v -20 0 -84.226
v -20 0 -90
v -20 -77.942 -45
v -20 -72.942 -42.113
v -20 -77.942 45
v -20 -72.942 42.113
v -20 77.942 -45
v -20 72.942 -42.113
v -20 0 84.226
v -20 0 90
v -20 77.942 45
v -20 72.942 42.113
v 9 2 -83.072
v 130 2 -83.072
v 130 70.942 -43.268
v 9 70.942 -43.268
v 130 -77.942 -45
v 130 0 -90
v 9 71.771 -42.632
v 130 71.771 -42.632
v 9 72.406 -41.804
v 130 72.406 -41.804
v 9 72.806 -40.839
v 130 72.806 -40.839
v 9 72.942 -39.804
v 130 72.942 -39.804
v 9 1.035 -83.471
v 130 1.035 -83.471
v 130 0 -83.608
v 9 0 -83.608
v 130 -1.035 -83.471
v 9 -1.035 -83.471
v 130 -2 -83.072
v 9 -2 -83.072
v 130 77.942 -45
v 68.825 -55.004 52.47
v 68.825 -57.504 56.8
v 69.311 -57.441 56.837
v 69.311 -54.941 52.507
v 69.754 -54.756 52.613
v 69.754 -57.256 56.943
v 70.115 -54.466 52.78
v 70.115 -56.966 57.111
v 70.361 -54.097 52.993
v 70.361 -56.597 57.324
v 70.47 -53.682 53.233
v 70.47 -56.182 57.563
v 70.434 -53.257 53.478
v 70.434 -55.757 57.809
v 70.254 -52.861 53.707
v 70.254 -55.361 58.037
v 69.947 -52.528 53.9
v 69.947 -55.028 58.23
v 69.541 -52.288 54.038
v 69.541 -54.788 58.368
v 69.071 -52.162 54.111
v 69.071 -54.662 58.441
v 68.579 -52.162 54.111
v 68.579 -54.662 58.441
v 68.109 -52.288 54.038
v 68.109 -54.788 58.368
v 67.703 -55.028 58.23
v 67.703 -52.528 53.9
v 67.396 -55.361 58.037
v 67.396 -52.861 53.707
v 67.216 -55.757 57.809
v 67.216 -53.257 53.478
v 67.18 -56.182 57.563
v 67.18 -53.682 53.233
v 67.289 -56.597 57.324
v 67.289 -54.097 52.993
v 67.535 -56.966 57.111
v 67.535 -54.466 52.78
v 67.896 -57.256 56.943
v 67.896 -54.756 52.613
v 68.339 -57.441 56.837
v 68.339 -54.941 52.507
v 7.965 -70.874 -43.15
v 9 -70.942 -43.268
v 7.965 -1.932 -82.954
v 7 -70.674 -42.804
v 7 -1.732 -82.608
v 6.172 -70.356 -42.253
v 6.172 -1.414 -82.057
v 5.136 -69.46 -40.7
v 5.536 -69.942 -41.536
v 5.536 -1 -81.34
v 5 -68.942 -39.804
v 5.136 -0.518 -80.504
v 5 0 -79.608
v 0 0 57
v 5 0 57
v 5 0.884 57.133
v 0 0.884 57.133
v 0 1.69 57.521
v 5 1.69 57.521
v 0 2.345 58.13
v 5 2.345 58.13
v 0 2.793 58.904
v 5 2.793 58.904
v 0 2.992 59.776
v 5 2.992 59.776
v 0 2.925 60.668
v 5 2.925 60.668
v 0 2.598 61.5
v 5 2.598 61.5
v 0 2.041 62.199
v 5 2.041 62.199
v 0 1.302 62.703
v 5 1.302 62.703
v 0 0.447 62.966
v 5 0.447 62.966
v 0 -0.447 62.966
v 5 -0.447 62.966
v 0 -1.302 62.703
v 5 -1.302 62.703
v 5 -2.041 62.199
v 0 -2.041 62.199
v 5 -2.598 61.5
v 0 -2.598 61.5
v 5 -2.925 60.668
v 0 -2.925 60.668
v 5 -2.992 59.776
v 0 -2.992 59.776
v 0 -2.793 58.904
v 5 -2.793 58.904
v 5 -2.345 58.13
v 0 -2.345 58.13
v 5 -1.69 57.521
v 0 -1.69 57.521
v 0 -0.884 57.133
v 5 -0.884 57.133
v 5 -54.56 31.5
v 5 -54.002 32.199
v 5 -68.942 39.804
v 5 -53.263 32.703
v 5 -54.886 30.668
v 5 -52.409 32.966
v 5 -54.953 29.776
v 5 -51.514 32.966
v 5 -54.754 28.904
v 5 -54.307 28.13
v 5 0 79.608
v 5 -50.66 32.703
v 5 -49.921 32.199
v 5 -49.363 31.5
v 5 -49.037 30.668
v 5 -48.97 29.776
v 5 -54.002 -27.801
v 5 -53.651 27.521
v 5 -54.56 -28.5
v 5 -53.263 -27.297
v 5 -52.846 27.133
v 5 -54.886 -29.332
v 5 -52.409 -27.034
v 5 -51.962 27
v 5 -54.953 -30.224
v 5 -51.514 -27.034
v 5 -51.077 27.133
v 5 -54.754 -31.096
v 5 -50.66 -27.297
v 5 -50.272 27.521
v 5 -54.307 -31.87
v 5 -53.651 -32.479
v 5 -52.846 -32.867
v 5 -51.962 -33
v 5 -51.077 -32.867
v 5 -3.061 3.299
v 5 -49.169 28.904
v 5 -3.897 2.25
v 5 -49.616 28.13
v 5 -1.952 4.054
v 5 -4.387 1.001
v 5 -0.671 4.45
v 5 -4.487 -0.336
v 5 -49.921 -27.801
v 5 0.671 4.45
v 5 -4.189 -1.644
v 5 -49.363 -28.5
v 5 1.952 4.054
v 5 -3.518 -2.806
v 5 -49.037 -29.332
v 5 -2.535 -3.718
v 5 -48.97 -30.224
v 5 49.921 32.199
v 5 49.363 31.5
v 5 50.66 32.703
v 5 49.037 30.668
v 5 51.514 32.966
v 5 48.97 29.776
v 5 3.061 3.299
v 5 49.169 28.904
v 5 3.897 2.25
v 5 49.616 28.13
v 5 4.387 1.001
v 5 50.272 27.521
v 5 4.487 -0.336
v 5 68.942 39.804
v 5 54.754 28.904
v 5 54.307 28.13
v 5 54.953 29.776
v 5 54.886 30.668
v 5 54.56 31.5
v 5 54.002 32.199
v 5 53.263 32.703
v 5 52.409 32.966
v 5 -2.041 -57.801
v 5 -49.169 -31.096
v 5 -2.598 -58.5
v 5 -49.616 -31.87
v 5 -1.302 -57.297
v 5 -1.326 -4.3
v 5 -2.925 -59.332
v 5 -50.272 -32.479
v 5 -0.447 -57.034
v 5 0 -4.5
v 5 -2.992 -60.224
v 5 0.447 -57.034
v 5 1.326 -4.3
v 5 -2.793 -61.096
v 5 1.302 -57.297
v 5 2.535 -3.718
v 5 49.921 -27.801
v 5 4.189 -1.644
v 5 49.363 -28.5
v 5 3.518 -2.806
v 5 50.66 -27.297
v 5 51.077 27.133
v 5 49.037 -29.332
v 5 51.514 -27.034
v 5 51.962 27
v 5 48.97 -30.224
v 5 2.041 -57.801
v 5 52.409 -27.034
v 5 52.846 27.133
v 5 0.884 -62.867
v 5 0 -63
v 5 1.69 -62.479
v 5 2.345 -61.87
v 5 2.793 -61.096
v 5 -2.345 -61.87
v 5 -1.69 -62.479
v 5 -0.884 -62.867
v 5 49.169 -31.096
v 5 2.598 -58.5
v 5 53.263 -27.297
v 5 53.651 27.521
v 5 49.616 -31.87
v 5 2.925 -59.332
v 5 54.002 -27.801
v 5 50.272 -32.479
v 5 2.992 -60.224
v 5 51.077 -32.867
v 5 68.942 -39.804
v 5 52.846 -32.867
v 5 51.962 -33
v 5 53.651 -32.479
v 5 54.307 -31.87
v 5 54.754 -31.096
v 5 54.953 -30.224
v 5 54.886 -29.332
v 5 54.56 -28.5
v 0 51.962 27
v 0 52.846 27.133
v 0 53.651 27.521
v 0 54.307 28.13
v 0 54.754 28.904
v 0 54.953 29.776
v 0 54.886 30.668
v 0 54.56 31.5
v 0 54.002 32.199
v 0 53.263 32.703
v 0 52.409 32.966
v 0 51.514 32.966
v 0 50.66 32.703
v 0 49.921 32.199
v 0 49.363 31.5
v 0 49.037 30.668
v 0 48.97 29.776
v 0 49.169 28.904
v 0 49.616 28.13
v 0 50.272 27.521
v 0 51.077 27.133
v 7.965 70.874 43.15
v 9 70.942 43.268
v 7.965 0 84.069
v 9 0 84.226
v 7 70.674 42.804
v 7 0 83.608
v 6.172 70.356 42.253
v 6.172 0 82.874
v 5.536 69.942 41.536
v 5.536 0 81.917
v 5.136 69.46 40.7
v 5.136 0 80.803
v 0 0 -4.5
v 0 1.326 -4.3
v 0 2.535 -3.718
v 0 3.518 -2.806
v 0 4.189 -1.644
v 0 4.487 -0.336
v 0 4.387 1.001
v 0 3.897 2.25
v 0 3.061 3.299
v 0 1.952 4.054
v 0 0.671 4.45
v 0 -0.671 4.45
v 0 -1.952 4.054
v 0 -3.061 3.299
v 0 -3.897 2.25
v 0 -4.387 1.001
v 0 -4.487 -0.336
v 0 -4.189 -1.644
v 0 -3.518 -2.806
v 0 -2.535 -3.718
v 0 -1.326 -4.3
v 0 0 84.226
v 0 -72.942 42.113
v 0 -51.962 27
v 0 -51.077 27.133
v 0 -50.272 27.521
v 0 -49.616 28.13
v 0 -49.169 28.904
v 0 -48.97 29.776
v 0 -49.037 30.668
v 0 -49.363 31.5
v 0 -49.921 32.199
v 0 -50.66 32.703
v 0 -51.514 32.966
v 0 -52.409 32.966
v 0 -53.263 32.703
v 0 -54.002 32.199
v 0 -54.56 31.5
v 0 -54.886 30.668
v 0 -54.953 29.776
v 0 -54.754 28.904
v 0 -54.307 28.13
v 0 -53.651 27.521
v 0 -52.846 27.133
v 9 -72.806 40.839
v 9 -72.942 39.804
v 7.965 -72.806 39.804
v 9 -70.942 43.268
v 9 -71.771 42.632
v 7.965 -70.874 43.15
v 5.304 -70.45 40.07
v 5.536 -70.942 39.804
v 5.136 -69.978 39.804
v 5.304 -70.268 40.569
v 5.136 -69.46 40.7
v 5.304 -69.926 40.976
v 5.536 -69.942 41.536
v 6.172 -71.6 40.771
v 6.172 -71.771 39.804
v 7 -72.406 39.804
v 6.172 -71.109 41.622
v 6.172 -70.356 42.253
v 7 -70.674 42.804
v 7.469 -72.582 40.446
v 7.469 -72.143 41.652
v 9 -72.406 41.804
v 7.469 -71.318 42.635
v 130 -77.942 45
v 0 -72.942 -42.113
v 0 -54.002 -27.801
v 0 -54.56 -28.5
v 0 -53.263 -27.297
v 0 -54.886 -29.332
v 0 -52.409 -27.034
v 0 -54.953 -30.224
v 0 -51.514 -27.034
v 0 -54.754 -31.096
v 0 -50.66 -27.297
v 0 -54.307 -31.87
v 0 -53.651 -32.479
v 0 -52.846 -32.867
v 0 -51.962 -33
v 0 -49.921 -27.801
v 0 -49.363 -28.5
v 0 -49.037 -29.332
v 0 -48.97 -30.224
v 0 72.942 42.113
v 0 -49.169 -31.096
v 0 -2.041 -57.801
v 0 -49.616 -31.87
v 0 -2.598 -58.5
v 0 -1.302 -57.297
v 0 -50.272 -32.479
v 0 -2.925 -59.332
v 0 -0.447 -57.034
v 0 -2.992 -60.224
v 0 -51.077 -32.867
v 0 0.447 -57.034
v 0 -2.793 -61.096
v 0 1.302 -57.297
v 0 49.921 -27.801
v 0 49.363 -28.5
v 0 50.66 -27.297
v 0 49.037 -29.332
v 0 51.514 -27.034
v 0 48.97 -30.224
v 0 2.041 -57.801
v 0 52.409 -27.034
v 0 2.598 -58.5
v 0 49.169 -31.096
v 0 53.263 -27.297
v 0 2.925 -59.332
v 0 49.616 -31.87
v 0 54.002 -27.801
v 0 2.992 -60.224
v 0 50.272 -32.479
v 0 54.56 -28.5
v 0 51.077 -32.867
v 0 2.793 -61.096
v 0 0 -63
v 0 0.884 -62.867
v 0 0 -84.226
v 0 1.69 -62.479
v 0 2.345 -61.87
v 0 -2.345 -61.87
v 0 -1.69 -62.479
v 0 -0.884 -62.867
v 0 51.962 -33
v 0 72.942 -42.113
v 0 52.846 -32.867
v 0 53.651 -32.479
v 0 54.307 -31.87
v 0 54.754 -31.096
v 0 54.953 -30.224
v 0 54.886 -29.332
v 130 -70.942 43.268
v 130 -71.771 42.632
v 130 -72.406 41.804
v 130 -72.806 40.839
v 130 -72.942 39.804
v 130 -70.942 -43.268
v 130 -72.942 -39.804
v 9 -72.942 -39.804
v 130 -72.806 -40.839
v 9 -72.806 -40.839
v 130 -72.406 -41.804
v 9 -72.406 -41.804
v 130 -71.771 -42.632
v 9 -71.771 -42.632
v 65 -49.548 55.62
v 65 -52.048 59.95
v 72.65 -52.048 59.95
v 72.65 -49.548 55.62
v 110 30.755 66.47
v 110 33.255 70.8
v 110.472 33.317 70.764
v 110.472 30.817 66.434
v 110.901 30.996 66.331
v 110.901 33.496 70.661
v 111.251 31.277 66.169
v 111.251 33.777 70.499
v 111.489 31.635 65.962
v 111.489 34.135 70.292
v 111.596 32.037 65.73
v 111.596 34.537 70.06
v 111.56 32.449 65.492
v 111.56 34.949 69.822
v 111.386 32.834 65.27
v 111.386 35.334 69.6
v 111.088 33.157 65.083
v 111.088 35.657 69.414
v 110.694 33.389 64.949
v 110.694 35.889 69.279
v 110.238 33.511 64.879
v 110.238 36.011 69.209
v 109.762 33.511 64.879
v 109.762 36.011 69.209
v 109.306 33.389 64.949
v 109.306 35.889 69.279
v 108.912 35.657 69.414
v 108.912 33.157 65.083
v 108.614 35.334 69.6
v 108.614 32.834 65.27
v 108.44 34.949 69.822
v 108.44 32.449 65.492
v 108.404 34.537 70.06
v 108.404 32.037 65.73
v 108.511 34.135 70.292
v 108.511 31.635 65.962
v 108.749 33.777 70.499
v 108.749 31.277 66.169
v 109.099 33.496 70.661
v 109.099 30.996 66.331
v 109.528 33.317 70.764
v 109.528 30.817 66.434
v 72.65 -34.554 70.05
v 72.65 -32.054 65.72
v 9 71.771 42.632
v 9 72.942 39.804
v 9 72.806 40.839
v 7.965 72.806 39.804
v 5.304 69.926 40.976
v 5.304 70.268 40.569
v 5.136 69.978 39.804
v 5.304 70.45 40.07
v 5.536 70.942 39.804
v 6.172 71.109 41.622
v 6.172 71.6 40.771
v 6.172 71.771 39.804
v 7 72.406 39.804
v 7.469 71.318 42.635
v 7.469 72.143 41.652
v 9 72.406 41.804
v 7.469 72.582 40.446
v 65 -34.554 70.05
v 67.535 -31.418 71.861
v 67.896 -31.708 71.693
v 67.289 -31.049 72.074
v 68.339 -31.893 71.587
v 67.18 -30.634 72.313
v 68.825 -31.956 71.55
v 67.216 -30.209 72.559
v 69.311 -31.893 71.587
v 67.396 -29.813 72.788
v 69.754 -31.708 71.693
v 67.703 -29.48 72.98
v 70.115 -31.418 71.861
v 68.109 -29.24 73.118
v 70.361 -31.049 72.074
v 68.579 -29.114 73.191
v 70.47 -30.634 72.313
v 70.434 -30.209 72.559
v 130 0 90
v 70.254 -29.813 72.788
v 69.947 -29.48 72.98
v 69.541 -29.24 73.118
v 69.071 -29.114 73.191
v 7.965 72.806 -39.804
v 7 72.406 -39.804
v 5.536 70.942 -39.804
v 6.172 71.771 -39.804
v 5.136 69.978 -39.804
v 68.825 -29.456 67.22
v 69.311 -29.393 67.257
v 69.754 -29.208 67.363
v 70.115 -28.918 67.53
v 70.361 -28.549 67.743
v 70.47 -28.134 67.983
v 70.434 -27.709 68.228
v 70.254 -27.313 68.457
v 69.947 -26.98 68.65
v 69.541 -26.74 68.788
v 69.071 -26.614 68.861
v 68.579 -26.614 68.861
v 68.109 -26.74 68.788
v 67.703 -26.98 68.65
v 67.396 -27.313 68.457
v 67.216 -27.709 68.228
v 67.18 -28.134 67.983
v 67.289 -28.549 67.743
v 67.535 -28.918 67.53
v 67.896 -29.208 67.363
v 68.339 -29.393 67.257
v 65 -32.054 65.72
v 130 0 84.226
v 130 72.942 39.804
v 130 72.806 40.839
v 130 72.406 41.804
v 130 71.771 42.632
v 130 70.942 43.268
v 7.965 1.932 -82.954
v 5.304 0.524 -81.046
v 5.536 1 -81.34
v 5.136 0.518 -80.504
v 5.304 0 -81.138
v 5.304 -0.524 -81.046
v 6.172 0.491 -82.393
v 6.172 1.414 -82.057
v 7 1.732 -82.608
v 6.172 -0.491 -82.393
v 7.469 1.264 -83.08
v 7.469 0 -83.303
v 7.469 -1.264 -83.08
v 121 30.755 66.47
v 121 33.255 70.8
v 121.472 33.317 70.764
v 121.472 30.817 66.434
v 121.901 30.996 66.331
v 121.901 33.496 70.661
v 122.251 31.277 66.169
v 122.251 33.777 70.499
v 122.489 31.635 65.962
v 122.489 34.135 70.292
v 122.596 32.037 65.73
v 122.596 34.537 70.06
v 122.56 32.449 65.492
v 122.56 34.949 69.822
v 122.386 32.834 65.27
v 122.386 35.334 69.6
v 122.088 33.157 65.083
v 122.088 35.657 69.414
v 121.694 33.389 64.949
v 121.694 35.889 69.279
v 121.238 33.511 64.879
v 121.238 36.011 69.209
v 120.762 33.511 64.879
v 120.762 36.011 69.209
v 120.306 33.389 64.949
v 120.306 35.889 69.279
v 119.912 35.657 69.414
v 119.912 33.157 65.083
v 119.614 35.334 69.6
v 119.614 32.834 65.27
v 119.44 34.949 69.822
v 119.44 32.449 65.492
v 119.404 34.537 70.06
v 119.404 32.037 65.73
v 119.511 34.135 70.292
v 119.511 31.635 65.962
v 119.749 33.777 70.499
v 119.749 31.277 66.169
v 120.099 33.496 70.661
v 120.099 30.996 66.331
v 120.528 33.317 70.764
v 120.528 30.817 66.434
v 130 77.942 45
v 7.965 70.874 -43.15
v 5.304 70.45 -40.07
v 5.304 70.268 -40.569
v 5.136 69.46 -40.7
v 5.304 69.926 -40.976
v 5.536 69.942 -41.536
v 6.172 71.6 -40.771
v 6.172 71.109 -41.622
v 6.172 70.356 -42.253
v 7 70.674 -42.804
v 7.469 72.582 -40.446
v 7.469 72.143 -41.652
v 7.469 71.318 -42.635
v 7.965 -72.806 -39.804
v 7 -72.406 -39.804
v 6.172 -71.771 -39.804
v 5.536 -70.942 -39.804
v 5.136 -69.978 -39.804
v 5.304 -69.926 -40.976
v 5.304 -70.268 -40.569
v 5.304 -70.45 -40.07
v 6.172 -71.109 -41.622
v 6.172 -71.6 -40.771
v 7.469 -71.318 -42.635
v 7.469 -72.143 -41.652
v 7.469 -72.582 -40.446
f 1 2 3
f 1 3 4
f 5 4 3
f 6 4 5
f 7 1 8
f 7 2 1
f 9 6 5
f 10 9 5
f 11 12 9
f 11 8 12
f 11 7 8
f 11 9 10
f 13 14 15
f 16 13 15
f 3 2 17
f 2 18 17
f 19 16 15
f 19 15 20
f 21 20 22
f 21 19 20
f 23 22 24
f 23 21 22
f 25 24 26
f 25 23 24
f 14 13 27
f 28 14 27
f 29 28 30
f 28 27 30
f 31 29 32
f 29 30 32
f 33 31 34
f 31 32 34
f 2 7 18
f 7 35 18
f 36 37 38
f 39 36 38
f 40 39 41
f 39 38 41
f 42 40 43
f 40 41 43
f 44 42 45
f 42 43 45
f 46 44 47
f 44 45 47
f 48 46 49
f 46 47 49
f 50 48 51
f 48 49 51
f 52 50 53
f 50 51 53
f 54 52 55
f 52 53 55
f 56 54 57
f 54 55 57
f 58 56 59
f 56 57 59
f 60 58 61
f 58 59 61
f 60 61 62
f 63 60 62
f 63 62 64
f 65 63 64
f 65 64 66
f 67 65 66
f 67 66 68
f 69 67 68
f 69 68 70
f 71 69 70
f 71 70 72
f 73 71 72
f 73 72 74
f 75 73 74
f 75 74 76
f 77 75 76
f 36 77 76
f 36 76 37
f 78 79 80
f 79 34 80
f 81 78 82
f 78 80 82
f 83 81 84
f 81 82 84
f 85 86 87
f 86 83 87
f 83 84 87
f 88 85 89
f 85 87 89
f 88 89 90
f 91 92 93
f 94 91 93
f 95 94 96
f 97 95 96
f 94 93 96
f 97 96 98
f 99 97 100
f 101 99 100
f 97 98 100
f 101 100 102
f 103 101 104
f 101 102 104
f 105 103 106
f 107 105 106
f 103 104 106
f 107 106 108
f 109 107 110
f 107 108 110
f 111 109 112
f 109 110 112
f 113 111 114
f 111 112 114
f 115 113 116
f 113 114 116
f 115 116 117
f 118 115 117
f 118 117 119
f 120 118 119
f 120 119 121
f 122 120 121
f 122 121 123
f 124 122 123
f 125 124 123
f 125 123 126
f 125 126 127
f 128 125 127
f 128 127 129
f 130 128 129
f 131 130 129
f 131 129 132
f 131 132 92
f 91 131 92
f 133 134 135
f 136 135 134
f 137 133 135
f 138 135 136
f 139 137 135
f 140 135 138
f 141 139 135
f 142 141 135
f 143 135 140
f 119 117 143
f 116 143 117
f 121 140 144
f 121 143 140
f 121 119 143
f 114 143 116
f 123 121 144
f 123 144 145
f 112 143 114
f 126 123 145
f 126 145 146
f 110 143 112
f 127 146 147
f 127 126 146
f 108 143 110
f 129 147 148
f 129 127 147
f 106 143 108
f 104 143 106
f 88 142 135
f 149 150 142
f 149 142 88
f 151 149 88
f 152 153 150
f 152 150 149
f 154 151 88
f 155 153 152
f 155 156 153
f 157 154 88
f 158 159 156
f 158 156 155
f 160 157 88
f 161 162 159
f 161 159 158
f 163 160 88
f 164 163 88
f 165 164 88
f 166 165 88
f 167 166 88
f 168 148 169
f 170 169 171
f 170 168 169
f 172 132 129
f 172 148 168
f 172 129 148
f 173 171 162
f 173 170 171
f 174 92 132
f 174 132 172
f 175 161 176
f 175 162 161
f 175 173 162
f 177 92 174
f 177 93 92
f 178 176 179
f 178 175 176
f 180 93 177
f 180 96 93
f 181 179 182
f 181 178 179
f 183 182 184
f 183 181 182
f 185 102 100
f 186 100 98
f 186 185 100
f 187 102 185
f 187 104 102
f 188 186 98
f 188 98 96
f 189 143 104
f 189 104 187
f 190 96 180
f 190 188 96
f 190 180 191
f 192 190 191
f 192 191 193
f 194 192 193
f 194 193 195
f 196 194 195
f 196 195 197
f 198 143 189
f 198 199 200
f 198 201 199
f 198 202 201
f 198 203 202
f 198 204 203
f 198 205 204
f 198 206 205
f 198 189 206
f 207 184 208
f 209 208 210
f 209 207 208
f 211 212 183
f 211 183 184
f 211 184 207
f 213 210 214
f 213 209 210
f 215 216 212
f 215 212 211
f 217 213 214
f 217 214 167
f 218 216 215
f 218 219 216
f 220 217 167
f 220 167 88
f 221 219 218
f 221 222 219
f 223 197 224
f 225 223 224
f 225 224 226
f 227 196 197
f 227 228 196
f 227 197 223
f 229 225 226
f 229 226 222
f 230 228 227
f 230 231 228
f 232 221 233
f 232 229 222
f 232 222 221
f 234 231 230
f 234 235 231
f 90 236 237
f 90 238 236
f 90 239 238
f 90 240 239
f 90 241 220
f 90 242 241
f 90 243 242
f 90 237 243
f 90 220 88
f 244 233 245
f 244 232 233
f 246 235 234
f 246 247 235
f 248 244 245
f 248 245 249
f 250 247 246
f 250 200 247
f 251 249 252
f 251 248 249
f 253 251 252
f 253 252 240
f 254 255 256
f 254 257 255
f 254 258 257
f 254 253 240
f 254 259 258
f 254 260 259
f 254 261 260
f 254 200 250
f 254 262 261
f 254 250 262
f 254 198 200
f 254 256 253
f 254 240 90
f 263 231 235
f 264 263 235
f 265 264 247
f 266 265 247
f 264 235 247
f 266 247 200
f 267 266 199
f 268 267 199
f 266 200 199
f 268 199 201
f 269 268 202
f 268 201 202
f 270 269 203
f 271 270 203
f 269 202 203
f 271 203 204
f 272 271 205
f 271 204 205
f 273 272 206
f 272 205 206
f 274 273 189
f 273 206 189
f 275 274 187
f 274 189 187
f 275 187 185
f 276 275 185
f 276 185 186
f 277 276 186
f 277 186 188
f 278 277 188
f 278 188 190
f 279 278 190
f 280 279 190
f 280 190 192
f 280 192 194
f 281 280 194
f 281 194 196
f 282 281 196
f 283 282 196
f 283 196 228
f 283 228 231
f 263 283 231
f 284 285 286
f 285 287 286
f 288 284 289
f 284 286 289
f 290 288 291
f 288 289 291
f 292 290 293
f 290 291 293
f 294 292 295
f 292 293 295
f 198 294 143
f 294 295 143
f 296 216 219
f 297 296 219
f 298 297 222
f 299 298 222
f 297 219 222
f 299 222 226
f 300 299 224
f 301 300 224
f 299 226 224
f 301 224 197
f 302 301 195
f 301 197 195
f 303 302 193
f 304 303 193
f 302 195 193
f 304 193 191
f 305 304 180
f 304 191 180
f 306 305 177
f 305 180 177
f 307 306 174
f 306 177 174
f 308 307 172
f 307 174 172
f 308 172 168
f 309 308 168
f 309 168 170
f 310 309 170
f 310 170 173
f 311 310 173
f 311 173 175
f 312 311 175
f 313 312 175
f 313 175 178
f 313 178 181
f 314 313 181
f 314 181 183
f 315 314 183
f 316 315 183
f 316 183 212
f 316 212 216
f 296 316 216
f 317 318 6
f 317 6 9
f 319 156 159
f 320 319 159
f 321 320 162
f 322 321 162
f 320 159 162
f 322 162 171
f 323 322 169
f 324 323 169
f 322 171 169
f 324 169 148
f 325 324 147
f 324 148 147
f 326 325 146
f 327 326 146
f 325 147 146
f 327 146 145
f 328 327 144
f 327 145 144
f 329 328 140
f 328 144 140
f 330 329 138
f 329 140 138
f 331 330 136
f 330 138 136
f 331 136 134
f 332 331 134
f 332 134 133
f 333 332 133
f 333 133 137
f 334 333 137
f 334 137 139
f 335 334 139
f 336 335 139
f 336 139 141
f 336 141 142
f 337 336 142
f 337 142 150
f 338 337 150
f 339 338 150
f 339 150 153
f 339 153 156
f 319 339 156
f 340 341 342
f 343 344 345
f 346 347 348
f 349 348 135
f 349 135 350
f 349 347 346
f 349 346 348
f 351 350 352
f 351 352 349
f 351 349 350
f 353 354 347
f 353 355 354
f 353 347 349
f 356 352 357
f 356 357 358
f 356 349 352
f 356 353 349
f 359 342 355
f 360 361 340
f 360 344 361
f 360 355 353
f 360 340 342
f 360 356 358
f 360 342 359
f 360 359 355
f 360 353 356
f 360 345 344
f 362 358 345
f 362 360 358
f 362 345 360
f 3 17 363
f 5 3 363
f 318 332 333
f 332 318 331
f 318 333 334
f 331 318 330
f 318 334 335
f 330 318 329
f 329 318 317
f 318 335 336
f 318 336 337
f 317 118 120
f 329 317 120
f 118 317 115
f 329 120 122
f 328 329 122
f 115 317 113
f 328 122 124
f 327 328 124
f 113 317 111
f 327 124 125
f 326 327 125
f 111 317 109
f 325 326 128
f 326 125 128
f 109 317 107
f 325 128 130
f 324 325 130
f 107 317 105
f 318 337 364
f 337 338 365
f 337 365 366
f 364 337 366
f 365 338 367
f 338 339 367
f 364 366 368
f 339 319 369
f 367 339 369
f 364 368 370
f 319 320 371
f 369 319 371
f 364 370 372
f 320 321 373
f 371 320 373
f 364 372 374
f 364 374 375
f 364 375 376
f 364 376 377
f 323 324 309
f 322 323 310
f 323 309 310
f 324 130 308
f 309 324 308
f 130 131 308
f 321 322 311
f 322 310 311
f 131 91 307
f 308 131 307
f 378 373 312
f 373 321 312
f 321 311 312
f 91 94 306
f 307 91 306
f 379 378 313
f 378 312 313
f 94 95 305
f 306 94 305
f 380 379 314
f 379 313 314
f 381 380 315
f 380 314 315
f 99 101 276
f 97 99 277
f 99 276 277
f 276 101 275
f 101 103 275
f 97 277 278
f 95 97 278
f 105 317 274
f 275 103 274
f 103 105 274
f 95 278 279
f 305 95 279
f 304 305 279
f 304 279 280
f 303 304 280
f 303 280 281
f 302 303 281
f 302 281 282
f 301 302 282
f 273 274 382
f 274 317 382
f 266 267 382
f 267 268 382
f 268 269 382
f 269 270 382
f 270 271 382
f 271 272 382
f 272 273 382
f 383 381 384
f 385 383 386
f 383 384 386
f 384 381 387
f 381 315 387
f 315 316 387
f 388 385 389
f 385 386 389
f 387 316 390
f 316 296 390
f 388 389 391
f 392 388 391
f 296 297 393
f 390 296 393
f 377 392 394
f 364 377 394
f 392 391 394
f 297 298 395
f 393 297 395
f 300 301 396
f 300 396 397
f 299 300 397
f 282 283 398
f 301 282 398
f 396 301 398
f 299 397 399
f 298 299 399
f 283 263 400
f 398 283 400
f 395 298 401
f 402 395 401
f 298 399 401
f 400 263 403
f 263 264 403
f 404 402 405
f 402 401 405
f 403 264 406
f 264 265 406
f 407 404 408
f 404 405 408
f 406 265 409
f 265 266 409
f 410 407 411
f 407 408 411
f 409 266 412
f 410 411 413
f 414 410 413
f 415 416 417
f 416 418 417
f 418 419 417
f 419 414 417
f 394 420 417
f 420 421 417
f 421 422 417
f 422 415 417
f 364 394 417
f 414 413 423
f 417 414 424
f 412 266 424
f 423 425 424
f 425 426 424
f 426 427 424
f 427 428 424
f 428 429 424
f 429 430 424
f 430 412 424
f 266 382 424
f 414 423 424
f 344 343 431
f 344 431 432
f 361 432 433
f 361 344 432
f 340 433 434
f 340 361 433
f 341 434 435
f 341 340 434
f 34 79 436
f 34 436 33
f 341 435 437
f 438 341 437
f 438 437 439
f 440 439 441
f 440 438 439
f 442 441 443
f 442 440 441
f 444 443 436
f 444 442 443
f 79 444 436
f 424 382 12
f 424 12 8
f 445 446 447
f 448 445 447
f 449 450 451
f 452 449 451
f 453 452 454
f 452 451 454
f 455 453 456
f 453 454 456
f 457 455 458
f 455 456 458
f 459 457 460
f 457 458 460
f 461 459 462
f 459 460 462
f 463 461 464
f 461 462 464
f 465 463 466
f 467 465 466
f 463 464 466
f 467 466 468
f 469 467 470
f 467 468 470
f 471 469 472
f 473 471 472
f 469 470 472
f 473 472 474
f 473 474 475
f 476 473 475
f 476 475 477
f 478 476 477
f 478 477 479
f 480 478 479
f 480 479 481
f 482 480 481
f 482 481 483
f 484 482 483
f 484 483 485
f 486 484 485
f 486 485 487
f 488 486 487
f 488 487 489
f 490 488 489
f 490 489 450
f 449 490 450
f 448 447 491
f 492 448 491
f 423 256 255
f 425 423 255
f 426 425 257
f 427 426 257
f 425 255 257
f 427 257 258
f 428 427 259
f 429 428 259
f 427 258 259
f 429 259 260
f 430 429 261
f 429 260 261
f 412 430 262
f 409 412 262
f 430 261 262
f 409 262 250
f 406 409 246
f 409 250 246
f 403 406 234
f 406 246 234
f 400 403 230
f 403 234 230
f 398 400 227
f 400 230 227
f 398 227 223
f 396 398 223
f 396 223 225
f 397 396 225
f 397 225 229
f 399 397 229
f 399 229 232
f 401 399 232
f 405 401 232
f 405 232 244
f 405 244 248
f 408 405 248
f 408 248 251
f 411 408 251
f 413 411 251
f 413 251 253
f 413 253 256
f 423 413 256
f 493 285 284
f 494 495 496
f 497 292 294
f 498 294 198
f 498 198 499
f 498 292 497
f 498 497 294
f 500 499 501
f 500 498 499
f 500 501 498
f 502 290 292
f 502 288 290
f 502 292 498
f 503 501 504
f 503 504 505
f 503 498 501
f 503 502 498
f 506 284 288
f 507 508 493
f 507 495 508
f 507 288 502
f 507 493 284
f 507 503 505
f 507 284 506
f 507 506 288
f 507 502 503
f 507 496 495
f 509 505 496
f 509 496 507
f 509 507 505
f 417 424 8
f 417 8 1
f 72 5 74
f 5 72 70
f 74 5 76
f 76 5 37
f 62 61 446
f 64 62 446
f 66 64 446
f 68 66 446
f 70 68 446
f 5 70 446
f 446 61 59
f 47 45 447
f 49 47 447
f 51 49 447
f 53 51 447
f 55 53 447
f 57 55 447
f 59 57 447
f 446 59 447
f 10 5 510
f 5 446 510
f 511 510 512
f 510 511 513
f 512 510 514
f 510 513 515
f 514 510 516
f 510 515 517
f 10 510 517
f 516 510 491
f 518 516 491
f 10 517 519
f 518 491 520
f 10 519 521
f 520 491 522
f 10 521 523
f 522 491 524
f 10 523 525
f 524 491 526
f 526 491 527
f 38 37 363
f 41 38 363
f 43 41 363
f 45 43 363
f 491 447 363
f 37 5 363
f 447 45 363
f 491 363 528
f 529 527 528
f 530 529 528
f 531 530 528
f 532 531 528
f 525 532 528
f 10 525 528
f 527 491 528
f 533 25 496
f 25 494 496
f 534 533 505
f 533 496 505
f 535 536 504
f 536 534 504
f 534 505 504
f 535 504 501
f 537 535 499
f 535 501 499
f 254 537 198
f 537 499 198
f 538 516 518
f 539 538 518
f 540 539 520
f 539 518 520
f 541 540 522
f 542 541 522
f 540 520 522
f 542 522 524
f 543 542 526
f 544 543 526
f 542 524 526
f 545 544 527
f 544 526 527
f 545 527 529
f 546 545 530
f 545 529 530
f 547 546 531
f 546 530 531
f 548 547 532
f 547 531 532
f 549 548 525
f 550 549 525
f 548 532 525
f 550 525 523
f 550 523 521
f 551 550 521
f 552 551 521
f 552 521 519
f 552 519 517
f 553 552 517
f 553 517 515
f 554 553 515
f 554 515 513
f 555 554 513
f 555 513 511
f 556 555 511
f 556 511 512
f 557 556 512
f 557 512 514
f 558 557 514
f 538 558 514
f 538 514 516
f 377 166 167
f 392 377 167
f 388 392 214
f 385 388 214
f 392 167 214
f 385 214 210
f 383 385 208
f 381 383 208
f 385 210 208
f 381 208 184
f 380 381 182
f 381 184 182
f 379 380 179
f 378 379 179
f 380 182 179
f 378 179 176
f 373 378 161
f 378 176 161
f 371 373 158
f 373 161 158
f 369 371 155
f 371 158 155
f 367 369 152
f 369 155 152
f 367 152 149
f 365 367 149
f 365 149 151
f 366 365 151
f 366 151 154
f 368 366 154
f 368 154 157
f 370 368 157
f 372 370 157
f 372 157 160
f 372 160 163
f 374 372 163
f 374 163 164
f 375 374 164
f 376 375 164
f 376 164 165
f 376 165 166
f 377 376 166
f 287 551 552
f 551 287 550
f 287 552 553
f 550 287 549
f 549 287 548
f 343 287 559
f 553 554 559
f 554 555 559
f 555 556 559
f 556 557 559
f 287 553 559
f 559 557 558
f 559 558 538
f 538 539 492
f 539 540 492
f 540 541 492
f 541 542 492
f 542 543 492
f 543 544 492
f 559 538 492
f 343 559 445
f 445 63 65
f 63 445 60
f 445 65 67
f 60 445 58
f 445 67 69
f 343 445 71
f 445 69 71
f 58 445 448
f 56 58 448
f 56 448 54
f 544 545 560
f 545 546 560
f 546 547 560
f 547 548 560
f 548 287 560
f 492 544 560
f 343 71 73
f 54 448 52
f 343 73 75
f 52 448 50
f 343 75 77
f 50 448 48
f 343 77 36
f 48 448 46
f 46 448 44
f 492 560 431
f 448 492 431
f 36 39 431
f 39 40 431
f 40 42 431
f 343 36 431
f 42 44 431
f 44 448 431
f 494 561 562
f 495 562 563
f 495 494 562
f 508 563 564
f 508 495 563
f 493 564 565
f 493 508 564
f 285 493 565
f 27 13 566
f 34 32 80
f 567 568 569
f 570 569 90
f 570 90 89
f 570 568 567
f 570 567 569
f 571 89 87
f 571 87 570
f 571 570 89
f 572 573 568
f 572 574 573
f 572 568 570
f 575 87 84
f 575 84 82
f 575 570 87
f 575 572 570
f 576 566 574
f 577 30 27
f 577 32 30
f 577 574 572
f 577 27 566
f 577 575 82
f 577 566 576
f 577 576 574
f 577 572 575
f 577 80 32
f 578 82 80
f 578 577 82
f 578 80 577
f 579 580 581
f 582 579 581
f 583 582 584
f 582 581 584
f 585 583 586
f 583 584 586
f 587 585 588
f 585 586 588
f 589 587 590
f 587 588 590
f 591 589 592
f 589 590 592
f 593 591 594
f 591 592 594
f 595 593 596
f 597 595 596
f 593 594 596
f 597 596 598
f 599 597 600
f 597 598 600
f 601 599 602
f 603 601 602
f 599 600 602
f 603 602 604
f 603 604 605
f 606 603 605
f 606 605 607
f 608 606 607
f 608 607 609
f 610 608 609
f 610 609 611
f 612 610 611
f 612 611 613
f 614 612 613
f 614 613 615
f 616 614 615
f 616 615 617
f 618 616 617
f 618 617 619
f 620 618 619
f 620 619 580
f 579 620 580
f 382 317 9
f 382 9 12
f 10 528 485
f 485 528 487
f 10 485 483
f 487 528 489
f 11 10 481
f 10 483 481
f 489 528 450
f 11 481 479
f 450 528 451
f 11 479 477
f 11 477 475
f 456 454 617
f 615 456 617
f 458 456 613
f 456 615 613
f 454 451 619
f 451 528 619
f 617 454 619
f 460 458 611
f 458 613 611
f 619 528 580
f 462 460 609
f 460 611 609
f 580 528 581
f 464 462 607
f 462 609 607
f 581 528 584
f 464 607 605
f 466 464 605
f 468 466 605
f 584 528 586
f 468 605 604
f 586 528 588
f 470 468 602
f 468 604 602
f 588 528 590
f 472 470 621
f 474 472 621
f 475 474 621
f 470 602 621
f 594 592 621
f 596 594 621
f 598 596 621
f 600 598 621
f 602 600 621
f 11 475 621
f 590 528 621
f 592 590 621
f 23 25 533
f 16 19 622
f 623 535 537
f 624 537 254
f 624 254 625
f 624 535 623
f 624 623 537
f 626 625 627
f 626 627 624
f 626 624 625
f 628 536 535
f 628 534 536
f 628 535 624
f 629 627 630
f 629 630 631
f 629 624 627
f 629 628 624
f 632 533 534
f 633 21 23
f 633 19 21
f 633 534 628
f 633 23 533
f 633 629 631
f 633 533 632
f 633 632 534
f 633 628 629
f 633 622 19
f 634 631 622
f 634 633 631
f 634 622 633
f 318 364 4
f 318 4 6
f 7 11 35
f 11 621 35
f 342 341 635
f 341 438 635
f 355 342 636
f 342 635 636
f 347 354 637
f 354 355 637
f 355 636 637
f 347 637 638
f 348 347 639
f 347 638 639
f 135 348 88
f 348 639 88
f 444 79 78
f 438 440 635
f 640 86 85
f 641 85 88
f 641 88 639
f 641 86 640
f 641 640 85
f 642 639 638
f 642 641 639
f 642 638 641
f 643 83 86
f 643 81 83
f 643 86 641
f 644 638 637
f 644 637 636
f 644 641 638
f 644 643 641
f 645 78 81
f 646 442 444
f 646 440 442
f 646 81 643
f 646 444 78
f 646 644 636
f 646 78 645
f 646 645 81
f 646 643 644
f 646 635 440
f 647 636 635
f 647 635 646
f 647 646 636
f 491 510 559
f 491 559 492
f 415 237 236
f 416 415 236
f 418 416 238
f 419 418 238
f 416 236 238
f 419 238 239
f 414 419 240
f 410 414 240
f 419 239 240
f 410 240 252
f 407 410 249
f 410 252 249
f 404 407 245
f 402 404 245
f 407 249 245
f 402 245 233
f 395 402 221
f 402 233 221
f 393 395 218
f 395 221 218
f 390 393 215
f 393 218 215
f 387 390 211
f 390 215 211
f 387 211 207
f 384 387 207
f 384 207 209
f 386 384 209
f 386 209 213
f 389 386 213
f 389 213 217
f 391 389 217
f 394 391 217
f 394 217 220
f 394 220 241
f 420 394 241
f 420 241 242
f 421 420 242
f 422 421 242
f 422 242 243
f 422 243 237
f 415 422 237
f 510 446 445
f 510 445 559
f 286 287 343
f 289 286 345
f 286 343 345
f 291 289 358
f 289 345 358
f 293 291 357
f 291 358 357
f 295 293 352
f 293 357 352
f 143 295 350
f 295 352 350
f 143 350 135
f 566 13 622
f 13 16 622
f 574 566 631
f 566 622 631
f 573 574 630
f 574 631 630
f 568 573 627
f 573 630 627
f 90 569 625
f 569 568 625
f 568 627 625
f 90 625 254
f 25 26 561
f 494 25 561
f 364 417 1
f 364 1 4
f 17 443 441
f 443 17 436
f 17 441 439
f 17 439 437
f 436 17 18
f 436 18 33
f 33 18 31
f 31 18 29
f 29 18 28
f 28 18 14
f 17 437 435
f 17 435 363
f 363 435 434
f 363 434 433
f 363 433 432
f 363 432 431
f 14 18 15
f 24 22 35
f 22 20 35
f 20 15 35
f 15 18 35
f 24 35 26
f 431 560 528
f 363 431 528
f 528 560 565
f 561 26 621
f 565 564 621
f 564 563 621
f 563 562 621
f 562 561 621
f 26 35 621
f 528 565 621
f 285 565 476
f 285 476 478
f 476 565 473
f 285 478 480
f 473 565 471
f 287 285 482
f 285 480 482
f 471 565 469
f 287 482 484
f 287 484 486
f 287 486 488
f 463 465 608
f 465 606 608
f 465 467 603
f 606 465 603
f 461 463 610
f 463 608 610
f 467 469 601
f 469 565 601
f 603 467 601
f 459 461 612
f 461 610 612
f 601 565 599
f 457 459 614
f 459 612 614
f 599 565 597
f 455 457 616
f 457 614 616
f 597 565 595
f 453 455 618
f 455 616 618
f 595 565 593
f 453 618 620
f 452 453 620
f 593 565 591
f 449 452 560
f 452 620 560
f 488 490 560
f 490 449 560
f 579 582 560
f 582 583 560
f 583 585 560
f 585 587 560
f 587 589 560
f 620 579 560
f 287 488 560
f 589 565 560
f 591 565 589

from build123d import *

# Parameters (mm, degrees)
BOSS_EXTRUDE1_DEPTH = 200
CUT_EXTRUDE1_DEPTH  = 195
SKETCH5_R           = 1.65
SKETCH5_W           = 7.65
SKETCH5_H           = 20.2
CUT_EXTRUDE4_DEPTH  = 70
SKETCH7_R           = 4.5
SKETCH7_R_2         = 3
CUT_EXTRUDE6_DEPTH  = 70
FILLET1_R           = 4
CUT_EXTRUDE7_DEPTH  = 70
SKETCH10_R          = 1.6
CUT_EXTRUDE8_DEPTH  = 6
BOSS_EXTRUDE2_DEPTH = 20


with BuildPart() as part:
    # Sketch1 → Boss-Extrude1 (new body)
    with BuildSketch(Plane(origin=(0, 0, 0), x_dir=(0, 0, -1), z_dir=(1, 0, 0))):
        Polygon((90, 0), (45, 77.942286341), (-45, 77.942286341), (-90, 0), (-45, -77.942286341), (45, -77.942286341), align=None)
    extrude(amount=BOSS_EXTRUDE1_DEPTH)

    # Sketch2 → Cut-Extrude1 (cut)
    with BuildSketch(Plane(origin=(200, 0, 0), x_dir=(0, 0, -1), z_dir=(1, 0, 0))):
        Polygon((84.226497308, 0), (42.113248654, 72.942286341), (-42.113248654, 72.942286341), (-84.226497308, 0), (-42.113248654, -72.942286341), (42.113248654, -72.942286341), align=None)
    extrude(amount=-CUT_EXTRUDE1_DEPTH, mode=Mode.SUBTRACT)

    # Sketch5 → Cut-Extrude4 (cut)
    with BuildSketch(Plane(origin=(0, -38.97114317, 67.5), x_dir=(1, 0, 0), z_dir=(0, -0.500000000000007, 0.8660254037844347))):
        with Locations(Location((68.825, 9.75, 0), (0, 0, 270))):
            Circle(SKETCH5_R)
        with Locations(Location((68.825, -19.75, 0), (0, 0, 270))):
            Circle(SKETCH5_R)
        with Locations((68.825, -5)):
            Rectangle(SKETCH5_W, SKETCH5_H)
    extrude(amount=-CUT_EXTRUDE4_DEPTH, mode=Mode.SUBTRACT)

    # Sketch7 → Cut-Extrude6 (cut)
    with BuildSketch(Plane(origin=(5, 0, 0), x_dir=(0, 0, -1), z_dir=(1, 0, 0))):
        Circle(SKETCH7_R)
        with Locations((60, 0)):
            Circle(SKETCH7_R_2)
        with Locations((30, 51.961524227)):
            Circle(SKETCH7_R_2)
        with Locations((-30, 51.961524227)):
            Circle(SKETCH7_R_2)
        with Locations((-60, 0)):
            Circle(SKETCH7_R_2)
        with Locations((-30, -51.961524227)):
            Circle(SKETCH7_R_2)
        with Locations((30, -51.961524227)):
            Circle(SKETCH7_R_2)
    extrude(amount=-CUT_EXTRUDE6_DEPTH, mode=Mode.SUBTRACT)

    # Fillet1
    fillet1_edges = [part.edges().sort_by_distance(p)[0] for p in [
        (5, -36.47114317, -63.169872981),
        (102.5, 0, -84.226497308),
        (5, -72.942286341, 0),
        (102.5, -72.942286341, -42.113248654),
        (5, -36.47114317, 63.169872981),
        (102.5, -72.942286341, 42.113248654),
        (5, 36.47114317, 63.169872981),
        (5, 72.942286341, 0),
        (102.5, 72.942286341, 42.113248654),
        (5, 36.47114317, -63.169872981),
        (102.5, 72.942286341, -42.113248654),
    ]]
    fillet(fillet1_edges, radius=FILLET1_R)

    # Sketch9 → Cut-Extrude7 (cut)
    with BuildSketch(Plane(origin=(200, 0, 0), x_dir=(0, 0, -1), z_dir=(1, 0, 0))):
        Polygon((45, 77.942286341), (90, 0), (45, -77.942286341), (-45, -77.942286341), (-90, 0), (-45, 77.942286341), align=None)
    extrude(amount=-CUT_EXTRUDE7_DEPTH, mode=Mode.SUBTRACT)

    # Sketch10 → Cut-Extrude8 (cut)
    with BuildSketch(Plane(origin=(0, 38.97114317, 67.5), x_dir=(1, 0, 0), z_dir=(0, 0.49999999999999495, 0.8660254037844417))):
        with Locations(Location((110, -5, 0), (0, 0, 270))):
            Circle(SKETCH10_R)
        with Locations(Location((121, -5, 0), (0, 0, 270))):
            Circle(SKETCH10_R)
    extrude(amount=-CUT_EXTRUDE8_DEPTH, mode=Mode.SUBTRACT)

    # Sketch11 → Boss-Extrude2 (add)
    with BuildSketch(Plane.ZY):
        Polygon((90, 0), (45, 77.942286341), (-45, 77.942286341), (-90, 0), (-45, -77.942286341), (45, -77.942286341), align=None)
        Polygon((84.226497308, 0), (42.113248654, 72.942286341), (-42.113248654, 72.942286341), (-84.226497308, 0), (-42.113248654, -72.942286341), (42.113248654, -72.942286341), align=None, mode=Mode.SUBTRACT)
    extrude(amount=BOSS_EXTRUDE2_DEPTH)


solid = part.part
